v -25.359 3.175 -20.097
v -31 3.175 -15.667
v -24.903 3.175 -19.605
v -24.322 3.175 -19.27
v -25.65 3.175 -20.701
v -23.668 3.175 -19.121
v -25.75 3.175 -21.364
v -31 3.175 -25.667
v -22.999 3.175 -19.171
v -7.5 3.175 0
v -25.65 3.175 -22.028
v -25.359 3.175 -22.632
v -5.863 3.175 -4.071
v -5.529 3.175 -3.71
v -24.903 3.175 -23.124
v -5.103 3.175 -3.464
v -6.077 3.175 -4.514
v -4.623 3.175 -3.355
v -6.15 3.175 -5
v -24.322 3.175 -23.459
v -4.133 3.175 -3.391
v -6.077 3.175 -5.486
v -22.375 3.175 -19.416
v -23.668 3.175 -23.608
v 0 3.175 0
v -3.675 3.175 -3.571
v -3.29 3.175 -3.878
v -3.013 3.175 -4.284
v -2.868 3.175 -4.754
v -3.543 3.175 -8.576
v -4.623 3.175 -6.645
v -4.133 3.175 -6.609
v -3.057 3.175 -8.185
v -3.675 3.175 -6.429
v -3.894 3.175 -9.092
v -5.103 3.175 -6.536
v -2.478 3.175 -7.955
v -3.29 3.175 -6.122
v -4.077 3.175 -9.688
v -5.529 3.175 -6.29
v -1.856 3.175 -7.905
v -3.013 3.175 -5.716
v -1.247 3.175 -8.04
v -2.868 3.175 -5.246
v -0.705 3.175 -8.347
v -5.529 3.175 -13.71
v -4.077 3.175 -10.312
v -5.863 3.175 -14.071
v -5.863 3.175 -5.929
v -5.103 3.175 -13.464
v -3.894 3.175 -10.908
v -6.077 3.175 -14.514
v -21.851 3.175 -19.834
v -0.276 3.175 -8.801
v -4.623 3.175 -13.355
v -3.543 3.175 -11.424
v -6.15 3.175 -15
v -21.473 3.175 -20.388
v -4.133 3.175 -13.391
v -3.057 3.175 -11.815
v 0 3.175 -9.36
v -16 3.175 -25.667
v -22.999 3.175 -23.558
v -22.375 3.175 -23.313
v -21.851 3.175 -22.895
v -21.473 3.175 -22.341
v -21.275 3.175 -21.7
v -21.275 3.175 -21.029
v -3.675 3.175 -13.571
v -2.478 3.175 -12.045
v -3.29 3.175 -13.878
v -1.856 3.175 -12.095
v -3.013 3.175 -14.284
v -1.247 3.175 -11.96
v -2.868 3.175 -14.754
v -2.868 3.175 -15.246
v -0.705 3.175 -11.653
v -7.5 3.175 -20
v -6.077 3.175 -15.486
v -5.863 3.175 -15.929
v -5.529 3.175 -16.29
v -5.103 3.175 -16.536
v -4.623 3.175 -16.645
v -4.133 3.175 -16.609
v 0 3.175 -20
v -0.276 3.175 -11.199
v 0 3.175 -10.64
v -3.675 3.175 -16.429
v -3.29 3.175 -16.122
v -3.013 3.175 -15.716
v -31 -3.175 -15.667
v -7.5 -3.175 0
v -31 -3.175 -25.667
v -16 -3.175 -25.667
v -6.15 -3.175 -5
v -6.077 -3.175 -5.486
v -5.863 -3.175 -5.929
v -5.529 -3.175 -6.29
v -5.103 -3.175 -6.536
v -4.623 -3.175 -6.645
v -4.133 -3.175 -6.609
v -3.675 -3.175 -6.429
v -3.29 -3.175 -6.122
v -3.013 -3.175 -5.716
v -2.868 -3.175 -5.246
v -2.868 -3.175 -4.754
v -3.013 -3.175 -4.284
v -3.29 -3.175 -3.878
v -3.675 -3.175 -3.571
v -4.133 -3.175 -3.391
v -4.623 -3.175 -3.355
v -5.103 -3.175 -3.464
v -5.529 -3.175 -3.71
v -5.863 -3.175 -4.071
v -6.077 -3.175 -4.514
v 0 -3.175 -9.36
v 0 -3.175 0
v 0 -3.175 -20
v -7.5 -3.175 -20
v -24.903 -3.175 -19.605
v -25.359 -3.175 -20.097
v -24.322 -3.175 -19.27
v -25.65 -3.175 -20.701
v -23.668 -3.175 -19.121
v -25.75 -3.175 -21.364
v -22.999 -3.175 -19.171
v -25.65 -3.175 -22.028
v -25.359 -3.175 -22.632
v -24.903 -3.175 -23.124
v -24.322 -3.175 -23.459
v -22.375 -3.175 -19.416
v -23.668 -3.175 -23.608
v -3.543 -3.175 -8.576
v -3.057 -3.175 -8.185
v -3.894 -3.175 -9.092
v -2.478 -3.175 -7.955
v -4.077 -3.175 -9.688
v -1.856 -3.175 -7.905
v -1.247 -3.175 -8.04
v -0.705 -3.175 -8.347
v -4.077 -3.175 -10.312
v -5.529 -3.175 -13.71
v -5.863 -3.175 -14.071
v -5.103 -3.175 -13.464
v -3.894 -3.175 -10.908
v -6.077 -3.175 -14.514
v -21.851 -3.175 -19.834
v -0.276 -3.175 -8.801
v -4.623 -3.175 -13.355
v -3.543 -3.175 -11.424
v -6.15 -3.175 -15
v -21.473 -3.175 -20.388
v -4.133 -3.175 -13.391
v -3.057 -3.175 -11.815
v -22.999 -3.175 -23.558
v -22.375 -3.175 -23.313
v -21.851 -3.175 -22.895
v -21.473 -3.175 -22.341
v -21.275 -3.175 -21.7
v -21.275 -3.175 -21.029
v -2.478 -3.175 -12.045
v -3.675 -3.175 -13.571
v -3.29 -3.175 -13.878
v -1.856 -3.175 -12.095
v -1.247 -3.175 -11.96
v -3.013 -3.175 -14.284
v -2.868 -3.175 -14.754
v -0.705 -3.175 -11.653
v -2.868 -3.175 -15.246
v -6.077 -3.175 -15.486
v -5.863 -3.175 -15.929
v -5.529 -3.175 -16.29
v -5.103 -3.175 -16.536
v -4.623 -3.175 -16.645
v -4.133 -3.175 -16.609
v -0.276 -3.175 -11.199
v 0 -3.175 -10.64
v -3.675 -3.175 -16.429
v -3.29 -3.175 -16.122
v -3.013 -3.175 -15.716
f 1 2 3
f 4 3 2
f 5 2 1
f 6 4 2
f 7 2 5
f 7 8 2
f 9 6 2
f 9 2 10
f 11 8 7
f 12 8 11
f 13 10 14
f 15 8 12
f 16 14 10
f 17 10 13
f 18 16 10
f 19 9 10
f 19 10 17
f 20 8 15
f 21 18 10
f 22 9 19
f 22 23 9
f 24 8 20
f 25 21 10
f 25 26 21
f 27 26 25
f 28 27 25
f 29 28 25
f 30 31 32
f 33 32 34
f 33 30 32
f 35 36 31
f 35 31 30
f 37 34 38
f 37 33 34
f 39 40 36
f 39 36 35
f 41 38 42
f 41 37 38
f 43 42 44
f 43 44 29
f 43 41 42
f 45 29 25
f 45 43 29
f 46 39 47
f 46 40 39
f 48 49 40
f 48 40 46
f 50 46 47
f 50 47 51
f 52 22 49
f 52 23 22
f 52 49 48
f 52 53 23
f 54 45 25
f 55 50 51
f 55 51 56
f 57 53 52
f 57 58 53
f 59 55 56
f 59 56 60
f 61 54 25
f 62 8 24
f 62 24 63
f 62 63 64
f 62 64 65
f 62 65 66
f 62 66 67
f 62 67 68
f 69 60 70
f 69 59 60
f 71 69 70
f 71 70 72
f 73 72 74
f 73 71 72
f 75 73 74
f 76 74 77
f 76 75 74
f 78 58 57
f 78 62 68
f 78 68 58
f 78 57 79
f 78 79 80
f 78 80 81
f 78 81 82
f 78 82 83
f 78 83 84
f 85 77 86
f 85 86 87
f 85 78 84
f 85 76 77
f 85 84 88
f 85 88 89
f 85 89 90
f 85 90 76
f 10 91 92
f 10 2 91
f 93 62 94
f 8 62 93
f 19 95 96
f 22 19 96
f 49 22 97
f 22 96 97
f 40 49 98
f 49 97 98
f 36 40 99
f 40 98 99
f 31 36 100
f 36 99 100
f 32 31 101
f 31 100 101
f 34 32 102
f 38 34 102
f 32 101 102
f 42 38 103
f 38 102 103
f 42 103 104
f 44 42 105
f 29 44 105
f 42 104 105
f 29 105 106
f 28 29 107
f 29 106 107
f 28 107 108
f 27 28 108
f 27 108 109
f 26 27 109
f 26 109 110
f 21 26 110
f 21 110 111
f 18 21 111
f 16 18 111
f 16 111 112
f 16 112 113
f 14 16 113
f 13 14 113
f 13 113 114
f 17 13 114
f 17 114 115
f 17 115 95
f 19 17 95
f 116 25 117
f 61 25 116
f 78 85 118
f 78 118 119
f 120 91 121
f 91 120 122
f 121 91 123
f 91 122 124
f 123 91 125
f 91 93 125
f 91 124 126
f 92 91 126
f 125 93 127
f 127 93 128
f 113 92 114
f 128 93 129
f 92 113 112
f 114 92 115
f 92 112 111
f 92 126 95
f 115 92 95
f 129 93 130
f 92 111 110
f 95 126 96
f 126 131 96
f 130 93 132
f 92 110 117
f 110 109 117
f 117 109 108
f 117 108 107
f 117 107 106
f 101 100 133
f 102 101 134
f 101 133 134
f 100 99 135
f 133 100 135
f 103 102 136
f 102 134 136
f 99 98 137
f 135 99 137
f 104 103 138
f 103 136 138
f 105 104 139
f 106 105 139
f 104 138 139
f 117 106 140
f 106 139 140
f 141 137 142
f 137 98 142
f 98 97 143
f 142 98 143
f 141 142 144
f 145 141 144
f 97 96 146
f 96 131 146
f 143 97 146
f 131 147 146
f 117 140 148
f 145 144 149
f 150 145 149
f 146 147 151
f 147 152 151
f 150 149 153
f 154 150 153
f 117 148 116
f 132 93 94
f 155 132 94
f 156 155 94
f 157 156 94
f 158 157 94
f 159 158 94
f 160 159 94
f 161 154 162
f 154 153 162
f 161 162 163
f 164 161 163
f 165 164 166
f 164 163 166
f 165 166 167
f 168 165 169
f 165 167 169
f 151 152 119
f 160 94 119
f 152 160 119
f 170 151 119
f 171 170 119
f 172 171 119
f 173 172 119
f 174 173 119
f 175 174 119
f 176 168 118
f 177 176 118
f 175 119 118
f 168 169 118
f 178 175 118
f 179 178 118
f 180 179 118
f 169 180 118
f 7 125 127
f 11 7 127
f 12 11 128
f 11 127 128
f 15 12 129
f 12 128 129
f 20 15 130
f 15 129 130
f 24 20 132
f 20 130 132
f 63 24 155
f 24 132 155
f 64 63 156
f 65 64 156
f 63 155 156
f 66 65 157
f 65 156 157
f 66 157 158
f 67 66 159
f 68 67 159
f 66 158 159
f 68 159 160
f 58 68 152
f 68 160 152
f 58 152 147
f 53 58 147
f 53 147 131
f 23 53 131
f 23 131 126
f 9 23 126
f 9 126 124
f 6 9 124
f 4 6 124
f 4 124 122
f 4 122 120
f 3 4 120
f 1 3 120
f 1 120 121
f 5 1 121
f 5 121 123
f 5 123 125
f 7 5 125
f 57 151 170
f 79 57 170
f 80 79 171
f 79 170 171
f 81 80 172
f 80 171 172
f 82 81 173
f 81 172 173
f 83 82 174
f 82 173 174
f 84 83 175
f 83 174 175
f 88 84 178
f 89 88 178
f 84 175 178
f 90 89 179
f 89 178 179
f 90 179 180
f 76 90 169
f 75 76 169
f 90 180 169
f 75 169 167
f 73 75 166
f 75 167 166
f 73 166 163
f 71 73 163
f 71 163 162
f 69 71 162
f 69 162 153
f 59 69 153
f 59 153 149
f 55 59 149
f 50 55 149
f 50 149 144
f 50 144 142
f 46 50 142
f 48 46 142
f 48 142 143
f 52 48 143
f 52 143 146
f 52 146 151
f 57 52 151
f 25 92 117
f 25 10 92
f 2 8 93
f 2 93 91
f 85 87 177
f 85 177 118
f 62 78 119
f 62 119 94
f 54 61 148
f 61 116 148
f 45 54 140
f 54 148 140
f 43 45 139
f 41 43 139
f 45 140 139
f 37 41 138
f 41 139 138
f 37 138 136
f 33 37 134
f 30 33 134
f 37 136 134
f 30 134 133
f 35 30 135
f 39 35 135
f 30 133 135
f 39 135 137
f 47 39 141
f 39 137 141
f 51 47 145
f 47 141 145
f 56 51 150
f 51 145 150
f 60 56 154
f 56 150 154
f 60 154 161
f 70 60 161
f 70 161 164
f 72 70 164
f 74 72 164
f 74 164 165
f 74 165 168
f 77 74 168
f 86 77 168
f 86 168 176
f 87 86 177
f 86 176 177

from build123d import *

# Parameters (mm, degrees)
BOSS_EXTRUDE1_DEPTH   = 3.175
M4_CLEARANCE_HOLE1_D  = 4.5
M4X0_7_TAPPED_HOLE1_D = 3.3
M5X0_8_TAPPED_HOLE1_D = 4.2


with BuildPart() as part:
    # Sketch1 → Boss-Extrude1 (new body, symmetric)
    with BuildSketch(Plane(origin=(0, 0, 0), x_dir=(1, 0, 0), z_dir=(0, 1, 0))):
        Polygon((0, 0), (0, 20), (-7.5, 20), (-16, 25.666666667), (-31, 25.666666667), (-31, 15.666666667), (-7.5, 0), align=None)
    extrude(amount=BOSS_EXTRUDE1_DEPTH, both=True)

    # M4 Clearance Hole1 (through all)
    with Locations(Plane(origin=(0, 3.175, 0), x_dir=(1, 0, 0), z_dir=(0, 1, 0))):
        with Locations((-23.5, 21.364471274)):
            Hole(M4_CLEARANCE_HOLE1_D / 2)

    # M4x0.7 Tapped Hole1 (through all)
    with Locations(Plane(origin=(0, 3.175, 0), x_dir=(1, 0, 0), z_dir=(0, 1, 0))):
        with Locations((-4.500000447, 15), (-4.500000447, 5)):
            Hole(M4X0_7_TAPPED_HOLE1_D / 2)

    # M5x0.8 Tapped Hole1 (through all)
    with Locations(Plane(origin=(0, 3.175, 0), x_dir=(1, 0, 0), z_dir=(0, 1, 0))):
        with Locations((-2, 10)):
            Hole(M5X0_8_TAPPED_HOLE1_D / 2)


solid = part.part
